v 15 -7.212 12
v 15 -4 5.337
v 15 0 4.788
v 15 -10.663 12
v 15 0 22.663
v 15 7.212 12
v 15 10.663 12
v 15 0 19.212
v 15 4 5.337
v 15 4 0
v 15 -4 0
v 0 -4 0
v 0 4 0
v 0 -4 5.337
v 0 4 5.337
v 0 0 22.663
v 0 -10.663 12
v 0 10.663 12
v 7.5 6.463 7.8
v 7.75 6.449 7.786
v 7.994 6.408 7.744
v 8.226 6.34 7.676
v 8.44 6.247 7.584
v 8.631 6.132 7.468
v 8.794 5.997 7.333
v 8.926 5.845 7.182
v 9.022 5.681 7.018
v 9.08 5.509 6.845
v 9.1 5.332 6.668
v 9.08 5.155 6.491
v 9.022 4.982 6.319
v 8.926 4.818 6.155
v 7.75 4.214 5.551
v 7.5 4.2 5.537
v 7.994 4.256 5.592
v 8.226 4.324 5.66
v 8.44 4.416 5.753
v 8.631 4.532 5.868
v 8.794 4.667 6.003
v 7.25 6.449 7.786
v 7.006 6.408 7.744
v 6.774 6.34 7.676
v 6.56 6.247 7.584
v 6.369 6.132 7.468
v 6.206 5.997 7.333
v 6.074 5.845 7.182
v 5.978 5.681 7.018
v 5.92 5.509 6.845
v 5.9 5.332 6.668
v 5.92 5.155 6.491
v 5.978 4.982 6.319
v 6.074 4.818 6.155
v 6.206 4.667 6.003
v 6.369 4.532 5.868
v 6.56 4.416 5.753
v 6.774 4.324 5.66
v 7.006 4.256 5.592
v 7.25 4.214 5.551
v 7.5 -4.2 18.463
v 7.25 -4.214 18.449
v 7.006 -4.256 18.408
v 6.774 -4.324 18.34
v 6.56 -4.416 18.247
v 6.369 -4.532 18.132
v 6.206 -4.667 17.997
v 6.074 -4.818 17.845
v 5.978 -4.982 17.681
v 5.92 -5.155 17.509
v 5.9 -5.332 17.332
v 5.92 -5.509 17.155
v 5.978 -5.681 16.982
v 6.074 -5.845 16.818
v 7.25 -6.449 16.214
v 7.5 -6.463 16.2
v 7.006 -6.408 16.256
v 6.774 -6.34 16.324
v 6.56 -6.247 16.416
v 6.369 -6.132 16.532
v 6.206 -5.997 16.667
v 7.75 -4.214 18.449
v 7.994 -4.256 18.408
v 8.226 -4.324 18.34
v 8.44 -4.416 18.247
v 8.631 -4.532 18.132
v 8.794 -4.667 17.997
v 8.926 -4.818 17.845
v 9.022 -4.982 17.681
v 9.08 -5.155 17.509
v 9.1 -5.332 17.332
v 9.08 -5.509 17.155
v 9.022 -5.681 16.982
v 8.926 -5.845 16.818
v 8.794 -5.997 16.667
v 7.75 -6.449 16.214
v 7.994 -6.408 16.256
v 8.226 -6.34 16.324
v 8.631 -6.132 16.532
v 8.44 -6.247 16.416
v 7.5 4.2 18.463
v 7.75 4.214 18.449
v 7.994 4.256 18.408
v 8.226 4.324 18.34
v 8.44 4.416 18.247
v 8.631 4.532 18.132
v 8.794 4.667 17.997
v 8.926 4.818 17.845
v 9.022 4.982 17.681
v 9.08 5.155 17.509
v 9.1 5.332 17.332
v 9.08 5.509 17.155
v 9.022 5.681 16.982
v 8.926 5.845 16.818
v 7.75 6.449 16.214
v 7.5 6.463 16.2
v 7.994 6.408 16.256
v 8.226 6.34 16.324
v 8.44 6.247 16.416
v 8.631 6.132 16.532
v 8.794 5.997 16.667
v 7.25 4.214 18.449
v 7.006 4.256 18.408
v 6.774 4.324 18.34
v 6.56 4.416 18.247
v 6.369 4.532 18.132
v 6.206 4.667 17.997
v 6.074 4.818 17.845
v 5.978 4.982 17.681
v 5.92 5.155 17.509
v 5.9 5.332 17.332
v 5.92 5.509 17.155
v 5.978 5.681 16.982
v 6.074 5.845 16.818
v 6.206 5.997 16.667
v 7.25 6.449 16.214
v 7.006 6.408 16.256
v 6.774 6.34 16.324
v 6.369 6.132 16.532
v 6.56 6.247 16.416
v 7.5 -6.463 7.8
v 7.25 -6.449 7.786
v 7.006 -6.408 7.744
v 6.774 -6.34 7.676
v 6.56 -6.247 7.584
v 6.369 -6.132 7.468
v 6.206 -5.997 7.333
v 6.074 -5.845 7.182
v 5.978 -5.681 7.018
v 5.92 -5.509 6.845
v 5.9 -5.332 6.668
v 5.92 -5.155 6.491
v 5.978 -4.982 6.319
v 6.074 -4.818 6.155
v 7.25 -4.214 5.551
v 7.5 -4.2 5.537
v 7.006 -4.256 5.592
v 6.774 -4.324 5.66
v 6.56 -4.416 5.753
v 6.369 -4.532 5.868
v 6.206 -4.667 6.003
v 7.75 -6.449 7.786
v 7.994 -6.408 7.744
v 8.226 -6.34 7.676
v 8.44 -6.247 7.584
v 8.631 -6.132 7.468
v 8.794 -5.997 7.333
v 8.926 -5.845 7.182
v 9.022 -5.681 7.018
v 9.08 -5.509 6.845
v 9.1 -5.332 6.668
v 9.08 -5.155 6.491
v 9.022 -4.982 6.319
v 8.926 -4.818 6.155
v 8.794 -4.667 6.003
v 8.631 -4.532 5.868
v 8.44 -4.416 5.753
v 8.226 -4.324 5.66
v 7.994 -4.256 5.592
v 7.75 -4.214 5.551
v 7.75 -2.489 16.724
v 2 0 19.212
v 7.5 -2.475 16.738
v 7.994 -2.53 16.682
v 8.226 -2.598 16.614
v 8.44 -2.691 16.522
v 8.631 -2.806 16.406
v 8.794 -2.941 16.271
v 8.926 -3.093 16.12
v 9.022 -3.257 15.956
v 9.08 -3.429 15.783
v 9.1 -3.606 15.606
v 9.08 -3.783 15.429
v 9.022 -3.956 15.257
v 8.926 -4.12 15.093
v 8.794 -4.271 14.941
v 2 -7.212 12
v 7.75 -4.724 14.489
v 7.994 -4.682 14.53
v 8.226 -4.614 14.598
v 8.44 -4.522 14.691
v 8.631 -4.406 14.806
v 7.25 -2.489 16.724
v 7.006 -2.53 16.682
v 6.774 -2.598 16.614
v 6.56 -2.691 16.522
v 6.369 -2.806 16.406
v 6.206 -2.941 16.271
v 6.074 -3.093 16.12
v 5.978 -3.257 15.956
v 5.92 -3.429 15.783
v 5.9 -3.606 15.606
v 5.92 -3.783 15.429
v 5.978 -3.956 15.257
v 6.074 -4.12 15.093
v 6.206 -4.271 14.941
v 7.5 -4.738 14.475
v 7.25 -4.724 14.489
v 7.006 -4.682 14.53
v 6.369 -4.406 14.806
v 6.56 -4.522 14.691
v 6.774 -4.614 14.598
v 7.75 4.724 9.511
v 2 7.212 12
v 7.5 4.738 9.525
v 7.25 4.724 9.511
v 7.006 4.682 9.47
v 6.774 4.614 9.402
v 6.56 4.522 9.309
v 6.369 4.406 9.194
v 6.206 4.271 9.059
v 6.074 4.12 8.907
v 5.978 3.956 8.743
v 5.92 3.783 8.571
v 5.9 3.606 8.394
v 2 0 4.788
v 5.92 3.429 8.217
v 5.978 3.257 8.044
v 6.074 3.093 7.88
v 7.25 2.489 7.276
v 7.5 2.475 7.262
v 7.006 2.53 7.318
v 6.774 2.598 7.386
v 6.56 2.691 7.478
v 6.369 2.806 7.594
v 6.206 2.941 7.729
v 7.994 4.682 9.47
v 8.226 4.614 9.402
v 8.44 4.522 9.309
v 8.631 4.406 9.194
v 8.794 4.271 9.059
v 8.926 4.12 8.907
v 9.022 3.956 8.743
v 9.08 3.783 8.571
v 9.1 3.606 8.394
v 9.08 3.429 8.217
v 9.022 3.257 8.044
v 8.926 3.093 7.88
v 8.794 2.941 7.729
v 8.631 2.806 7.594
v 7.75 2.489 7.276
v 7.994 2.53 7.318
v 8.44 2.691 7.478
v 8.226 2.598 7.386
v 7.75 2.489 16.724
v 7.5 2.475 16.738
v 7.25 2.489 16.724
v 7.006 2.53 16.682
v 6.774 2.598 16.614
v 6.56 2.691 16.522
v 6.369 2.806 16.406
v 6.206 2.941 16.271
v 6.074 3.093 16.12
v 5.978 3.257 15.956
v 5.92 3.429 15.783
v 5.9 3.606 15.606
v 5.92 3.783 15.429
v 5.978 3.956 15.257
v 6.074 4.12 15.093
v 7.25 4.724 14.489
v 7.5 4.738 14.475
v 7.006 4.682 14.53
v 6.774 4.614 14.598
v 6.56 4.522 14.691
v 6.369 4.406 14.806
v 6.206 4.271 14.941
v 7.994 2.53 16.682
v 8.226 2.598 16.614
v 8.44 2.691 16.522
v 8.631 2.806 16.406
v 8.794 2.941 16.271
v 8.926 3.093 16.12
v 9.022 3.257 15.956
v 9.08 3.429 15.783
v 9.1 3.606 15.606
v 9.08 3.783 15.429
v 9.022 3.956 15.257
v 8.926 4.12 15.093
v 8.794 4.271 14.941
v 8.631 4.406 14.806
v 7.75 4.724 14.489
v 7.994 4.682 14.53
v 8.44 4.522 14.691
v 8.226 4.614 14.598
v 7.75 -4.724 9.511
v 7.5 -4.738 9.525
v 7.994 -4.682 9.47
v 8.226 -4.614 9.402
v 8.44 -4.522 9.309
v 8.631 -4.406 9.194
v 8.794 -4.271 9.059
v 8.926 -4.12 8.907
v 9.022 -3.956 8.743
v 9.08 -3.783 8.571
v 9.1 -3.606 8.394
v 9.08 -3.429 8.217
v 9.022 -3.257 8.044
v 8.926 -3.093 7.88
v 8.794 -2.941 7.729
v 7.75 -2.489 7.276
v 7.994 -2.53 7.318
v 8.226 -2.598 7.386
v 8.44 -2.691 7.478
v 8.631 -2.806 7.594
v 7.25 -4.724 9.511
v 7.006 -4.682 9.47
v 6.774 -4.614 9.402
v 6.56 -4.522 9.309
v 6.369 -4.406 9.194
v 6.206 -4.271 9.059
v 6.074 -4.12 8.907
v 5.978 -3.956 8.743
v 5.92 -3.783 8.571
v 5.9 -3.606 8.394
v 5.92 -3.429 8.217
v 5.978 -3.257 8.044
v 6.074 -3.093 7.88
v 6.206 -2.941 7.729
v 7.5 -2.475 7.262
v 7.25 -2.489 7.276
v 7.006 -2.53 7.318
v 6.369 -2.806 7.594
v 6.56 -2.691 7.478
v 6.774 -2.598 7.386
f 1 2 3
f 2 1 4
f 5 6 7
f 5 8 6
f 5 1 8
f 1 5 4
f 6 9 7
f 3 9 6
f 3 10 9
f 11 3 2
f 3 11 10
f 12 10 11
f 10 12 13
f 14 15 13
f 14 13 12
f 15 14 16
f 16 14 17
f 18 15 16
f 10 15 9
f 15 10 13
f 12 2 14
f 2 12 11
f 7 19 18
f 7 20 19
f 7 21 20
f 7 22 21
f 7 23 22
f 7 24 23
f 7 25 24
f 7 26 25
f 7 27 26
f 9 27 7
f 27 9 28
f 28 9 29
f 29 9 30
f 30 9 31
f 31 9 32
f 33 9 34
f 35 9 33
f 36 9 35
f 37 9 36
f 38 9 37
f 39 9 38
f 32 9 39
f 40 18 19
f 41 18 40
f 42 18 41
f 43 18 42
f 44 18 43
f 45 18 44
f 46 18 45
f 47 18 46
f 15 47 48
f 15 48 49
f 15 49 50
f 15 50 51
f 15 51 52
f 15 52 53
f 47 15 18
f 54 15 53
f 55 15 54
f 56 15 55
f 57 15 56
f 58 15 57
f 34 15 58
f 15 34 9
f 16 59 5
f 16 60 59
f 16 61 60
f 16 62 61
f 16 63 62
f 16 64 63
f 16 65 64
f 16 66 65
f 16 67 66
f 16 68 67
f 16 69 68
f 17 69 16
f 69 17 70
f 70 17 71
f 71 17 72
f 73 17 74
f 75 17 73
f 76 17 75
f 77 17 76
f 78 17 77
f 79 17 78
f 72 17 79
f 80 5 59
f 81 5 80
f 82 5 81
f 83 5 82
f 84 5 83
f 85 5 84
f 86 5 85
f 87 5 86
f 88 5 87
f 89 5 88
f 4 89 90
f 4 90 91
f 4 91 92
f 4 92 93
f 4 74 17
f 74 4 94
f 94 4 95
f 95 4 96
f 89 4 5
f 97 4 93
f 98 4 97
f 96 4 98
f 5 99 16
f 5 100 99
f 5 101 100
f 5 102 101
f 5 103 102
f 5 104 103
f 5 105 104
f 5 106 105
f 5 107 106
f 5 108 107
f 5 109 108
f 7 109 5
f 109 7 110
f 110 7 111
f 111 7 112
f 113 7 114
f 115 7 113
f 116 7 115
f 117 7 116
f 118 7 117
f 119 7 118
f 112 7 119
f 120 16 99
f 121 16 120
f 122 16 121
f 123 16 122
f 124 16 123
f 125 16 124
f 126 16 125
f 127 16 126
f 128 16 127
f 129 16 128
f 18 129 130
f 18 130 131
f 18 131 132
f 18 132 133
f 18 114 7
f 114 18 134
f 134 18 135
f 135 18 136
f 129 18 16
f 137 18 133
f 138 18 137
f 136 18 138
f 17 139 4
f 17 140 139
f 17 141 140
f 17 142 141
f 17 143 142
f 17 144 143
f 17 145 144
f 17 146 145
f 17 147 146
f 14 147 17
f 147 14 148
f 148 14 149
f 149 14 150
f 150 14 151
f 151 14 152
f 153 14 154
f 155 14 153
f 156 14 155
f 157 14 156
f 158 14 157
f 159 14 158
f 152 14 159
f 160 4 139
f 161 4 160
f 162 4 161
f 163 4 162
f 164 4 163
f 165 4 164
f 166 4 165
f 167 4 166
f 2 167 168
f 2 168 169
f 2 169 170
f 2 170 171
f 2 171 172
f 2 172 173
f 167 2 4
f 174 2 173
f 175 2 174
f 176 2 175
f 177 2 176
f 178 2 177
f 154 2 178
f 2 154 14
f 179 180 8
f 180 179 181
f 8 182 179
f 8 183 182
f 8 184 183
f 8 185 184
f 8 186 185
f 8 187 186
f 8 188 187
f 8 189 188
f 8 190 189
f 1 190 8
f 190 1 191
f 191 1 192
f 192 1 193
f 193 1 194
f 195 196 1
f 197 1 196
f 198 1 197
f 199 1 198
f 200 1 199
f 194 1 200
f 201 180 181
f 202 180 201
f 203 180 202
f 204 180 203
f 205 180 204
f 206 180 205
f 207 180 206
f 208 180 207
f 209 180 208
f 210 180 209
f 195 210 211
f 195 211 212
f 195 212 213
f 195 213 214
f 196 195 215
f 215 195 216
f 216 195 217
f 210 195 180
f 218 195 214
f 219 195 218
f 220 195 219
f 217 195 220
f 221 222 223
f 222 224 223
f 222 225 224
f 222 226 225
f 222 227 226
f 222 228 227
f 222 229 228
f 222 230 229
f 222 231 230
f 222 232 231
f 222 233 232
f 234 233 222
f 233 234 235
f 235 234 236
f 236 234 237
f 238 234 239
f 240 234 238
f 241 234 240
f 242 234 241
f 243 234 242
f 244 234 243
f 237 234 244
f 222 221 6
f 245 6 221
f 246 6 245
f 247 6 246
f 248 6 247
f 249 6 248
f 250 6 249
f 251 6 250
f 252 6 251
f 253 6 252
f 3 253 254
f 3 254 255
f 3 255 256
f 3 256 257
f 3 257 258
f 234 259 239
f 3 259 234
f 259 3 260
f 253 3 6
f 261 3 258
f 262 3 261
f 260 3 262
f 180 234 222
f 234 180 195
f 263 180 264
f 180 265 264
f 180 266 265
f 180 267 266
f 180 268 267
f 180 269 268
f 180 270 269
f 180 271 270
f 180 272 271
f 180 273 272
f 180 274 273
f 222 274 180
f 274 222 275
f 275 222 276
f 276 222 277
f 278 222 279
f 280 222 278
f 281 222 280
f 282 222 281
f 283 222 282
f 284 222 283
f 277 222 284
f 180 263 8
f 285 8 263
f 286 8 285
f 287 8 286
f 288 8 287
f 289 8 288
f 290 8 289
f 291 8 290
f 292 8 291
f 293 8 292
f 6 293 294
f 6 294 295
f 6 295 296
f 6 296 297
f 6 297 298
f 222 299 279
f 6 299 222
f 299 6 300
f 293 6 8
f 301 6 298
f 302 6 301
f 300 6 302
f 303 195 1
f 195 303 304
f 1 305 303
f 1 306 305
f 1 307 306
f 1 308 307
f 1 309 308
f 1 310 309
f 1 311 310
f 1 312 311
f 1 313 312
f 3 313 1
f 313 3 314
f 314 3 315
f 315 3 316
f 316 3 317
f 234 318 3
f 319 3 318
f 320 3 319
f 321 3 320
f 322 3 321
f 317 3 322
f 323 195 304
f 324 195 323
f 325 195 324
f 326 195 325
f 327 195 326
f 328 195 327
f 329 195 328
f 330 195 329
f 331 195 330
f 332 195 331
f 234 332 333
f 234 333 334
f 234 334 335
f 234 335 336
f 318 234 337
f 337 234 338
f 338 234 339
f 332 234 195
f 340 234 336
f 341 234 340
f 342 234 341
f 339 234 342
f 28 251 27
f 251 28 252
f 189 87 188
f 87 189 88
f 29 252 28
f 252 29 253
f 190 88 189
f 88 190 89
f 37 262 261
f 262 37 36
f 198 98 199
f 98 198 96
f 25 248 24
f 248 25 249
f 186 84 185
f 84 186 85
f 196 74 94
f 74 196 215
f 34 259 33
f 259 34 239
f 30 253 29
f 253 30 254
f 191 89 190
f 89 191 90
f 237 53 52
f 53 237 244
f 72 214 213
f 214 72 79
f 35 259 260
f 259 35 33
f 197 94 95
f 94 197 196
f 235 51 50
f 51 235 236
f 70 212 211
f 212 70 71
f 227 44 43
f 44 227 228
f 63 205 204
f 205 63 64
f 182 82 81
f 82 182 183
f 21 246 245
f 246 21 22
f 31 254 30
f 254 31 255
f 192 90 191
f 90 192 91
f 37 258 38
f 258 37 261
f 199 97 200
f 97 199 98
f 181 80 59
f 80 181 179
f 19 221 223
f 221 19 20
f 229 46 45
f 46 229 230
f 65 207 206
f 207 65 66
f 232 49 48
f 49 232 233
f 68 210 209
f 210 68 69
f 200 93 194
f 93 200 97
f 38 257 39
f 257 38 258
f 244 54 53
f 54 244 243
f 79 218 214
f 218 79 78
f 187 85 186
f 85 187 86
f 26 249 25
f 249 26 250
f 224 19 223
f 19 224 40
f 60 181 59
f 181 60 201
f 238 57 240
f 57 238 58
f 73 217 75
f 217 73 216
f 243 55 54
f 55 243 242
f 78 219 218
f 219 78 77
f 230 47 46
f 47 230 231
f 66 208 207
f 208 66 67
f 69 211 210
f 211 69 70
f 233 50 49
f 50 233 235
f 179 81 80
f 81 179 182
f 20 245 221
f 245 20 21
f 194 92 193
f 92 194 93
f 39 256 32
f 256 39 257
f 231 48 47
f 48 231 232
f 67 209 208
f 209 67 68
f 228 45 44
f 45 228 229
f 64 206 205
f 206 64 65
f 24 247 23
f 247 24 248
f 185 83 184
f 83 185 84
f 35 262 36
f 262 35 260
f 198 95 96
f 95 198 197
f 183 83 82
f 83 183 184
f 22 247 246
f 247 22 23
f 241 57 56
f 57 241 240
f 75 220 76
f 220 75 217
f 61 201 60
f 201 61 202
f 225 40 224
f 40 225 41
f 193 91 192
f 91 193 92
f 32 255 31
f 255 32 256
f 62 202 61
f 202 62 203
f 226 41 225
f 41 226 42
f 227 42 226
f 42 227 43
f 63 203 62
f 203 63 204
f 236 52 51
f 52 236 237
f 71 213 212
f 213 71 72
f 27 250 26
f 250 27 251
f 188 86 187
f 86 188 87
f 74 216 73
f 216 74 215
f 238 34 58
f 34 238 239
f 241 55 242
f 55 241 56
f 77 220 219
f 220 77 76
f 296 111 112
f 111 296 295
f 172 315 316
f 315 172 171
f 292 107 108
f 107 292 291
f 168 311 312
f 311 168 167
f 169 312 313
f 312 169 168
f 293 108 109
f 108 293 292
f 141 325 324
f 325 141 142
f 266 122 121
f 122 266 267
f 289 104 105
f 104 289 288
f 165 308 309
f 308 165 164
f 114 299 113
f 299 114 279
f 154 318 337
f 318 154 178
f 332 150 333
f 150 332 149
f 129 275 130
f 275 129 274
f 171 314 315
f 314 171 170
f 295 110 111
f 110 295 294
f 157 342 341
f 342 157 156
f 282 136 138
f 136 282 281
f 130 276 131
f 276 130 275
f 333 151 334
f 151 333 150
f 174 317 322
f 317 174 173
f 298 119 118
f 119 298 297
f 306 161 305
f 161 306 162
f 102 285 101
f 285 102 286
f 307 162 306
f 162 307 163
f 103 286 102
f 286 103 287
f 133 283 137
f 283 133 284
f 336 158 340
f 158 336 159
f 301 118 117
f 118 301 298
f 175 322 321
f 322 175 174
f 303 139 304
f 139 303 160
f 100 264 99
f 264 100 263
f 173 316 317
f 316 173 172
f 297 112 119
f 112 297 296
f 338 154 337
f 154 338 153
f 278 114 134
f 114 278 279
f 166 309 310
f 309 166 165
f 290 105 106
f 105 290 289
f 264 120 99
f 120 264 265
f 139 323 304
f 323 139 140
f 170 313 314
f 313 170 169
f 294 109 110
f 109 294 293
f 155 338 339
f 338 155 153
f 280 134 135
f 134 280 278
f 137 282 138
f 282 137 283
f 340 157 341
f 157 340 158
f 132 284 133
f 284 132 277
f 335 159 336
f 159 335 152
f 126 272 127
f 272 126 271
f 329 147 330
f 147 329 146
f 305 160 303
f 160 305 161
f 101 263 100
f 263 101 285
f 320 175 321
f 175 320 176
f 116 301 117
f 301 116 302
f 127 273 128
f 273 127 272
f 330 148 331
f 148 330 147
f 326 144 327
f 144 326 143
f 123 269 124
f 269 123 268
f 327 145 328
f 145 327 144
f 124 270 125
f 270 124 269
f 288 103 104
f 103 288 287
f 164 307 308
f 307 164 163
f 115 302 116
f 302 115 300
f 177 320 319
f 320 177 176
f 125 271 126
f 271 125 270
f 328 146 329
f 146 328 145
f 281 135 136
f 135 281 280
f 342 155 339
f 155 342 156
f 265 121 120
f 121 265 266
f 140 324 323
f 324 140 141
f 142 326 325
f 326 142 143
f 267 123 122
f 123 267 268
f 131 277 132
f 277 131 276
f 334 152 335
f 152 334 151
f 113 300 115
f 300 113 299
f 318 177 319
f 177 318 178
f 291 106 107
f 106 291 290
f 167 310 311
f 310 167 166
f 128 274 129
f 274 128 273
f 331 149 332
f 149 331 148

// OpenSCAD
// MakerBeam Library
// Version 20100413

// Copyright 2010, by Andrew Plumb
// Licensed under the Attribution - Creative Commons license
//   http://creativecommons.org/licenses/by/3.0/

// - Uses smallest length MakerBeam Mini-T beams
// - Fits diagonally on my Batch 1 MakerBot Z-platform

// For more information about OpenSCAD:
//   - see http://www.openscad.org/
// For more information about MakerBeam:
//   - see http://www.makerbeam.com/

// To Do:
// - make corner pieces with integrated bearing brackets.

$fa=9;
$fs=0.1;

scale_1in=25.4;

// render_part=3; // The part the Flex-Shaft screws into.
// render_part=6; // An optional part to bolt on the Flex-Shaft handle
// render_part=9; // The Mini-T to Z-platform M5 bolt hold adapter part
 render_part=10; // mini_t_socket


module mini_t_socket(
	rotAngle=0
	, mini_t_z=12.0
	, mini_t_r=15.0/2
	, mini_t_d=15.0
	, mini_t_wall=0.1*scale_1in
  ) {
  difference () {
    union () {
	    rotate([0,0,rotAngle])translate([mini_t_r-mini_t_d/2,-4.0,0]) {
		scale([mini_t_d,8.0,mini_t_z]) cube(size=1.0,center=false);
	    }
	    rotate([0,0,rotAngle])
		translate([mini_t_r
		  , 0
		  , mini_t_z
		])
		rotate([45,0,0])
		  scale([mini_t_d,10.0+2*mini_t_wall,10.0+2*mini_t_wall])
			cube(size=1.0,center=true);
    }
    union () {
	    rotate([0,0,rotAngle])
		translate([mini_t_r
			, 0.0
			, mini_t_z
		]) rotate([45,0,0]) {
		  translate([2.0,0,0]) scale([mini_t_d,10.2,10.2])
			cube(size=1.0,center=true);
		  cylinder(r=1.6
			, h=20.0
			, center=true
		  );
		  rotate([90,0,0]) cylinder(r=1.6
			, h=20.0
			, center=true
		  );
	    }
    }
  }
}


module dremel_flexshaft_mount_body(
	arms=6
	, mini_t_z=12.0
	, mini_t_r=20.0
	, mini_t_d=10.0
	, mini_t_wall=0.1*scale_1in
  ) {
  union () {
	difference() { 
	  cylinder(
	    r=0.75*scale_1in
	    , h=1.7*0.25*scale_1in
	    , center=false
	  );
	  translate([0,0,0.25*scale_1in])
		cylinder(
		  r=0.5*scale_1in
		  , h=0.25*scale_1in+0.1
		  , center=false
		);
	}
	for( i=[0:arms-1] ) {
	  assign(rotAngle=i*360/arms) {
	    rotate([0,0,rotAngle])translate([mini_t_r-mini_t_d/2,-4.0,0]) {
		scale([mini_t_d,8.0,mini_t_z]) cube(size=1.0,center=false);
	    }
	    rotate([0,0,rotAngle])
		translate([mini_t_r
		  , 0
		  , mini_t_z
		])
		rotate([45,0,0])
		  scale([mini_t_d,10.0+2*mini_t_wall,10.0+2*mini_t_wall])
			cube(size=1.0,center=true);
	  }
	}
  }
}

module dremel_flexshaft_mount_holes(
	arms=6
	, mini_t_z=12.0
	, mini_t_r=20.0
	, mini_t_d=10.0
  ) {
  union () {
	translate([0,0,-0.5*scale_1in]) cylinder(
	  r=0.25*scale_1in
	  , h=1.0*scale_1in
	  , center=false
	);
	for( i=[0:arms-1] ) {
	  assign(rotAngle=i*360/arms) {
	    rotate([0,0,rotAngle])
		translate([mini_t_r
			, 0.0
			, mini_t_z
		]) rotate([45,0,0]) {
		  translate([2.0,0,0]) scale([mini_t_d,10.2,10.2])
			cube(size=1.0,center=true);
		  cylinder(r=1.6
			, h=20.0
			, center=true
		  );
		  rotate([90,0,0]) cylinder(r=1.6
			, h=20.0
			, center=true
		  );
	    }
	  }
	}
  }
}

module dremel_flexshaft_mount() {
  difference () {
    dremel_flexshaft_mount_body(mini_t_z=10.0);
    dremel_flexshaft_mount_holes(mini_t_z=10.0);
    translate([0,0,-10.0])
	cylinder(r=50.0,h=10.0,center=false);
  }
}

module handle_body(arms=6) {
  union () {
	translate([0,0,0]) cylinder(
	  r=(1.0+0.5)*scale_1in/2
	  , h=1.0*scale_1in
	  , center=false
	);
	for( i=[0:arms-1] ) {
	  assign(rotAngle=i*360/arms) {
	    rotate([0,0,rotAngle])translate([20.0+2.5,0,5.0/2]) {
		scale([11.0,8.0,5.0]) cube(size=1.0,center=true);
	    }
	    rotate([45,0,rotAngle])
		translate([22.0
			,1.414*10.0/2+0.47
			,1.414*10.0/2+0.47
		])
		  scale([12.0,10.0+2*0.1*scale_1in,10.0+2*0.1*scale_1in])
			cube(size=1.0,center=true);
	  }
	}
  }
}

module handle_holes(arms=6) {
  union () {
	translate([0,0,-1.0*scale_1in/2]) cylinder(
	  r=0.5*scale_1in
	  , h=2.0*scale_1in
	  , center=false
	);
	for( i=[0:arms-1] ) {
	  assign(rotAngle=i*360/arms) {
	    rotate([45,0,rotAngle]) {
		translate([23.0
			,1.414*10.0/2+0.47
			,1.414*10.0/2+0.47
		])
		  scale([12.0,10.2,10.2])
			cube(size=1.0,center=true);
		translate([23.0
			,1.414*10.0/2+0.47
			,1.414*10.0/2+0.47]) {
		  cylinder(r=1.6
			, h=20.0
			, center=true
		  );
		  rotate([90,0,0]) cylinder(r=1.6
			, h=20.0
			, center=true
		  );
		}
	    }
	    rotate([0,0,rotAngle]) {
		translate([0,0,0.8*scale_1in]) {
		  rotate([90,rotAngle,0]) cylinder(r=1.5,h=2.0*scale_1in,center=false);
		  translate([0,1.0*scale_1in/2,0])
		    scale([6.5,5.5,0.5*scale_1in+3.0]) cube(size=1.0, center=true);
		}
	    }
	  }
	}
  }
}

module flex_handle() {
  difference () {
    handle_body();
    handle_holes();
  }
}

module bracket_body(arms=3) {
  union () {
	cylinder(
	  r=12.0
	  , h=11.0
	  , center=false
	);
	for( i=[0:arms-1] ) {
	  assign(rotAngle=i*360/arms) {
	    rotate([0,0,rotAngle])translate([12.0+2.5,0,5.0/2]) {
		scale([7.0,8.0,5.0]) cube(size=1.0,center=true);
	    }
	    rotate([45,0,rotAngle]) {
		translate([12.0
			,1.414*10.0/2+0.47
			,1.414*10.0/2+0.47
		])
		  scale([12.0,10.0+2*0.1*scale_1in,10.0+2*0.1*scale_1in])
			cube(size=1.0,center=true);
	    }
	  }
	}
  }
}

module bracket_holes(arms=3) {
  union () {
	translate([0,0,-0.1]) cylinder(
	  r=2.5
	  , h=11.0+0.2
	  , center=false
	);
	translate([0,0,5.0]) cylinder(
	  r=6.0
	  , h=6.0+0.1
	  , center=false
	);
	for( i=[0:arms-1] ) {
	  assign(rotAngle=i*360/arms) {
	    rotate([45,0,rotAngle]) {
		translate([13.0
			,1.414*10.0/2+0.47
			,1.414*10.0/2+0.47
		])
		  scale([12.0,10.2,10.2])
			cube(size=1.0,center=true);
		translate([13.0
			,1.414*10.0/2+0.47
			,1.414*10.0/2+0.47]) {
		  cylinder(r=1.6
			, h=20.0
			, center=true
		  );
		  rotate([90,0,0]) cylinder(r=1.6
			, h=20.0
			, center=true
		  );
		}
	    }
	  }
	}
  }
}

module flex_bracket() {
  difference () {
    bracket_body();
    bracket_holes();
  }
}


if( render_part==1 ) {
  echo("Rendering dremel_flexshaft_mount_body()...");
  dremel_flexshaft_mount_body();
}


if( render_part==2 ) {
  echo("Rendering dremel_flexshaft_mount_holes()...");
  dremel_flexshaft_mount_holes();
}

if( render_part==3 ) {
  echo("Rendering dremel_flexshaft_mount()...");
  dremel_flexshaft_mount();
}

if( render_part==4 ) {
  echo("Rendering handle_body()...");
  handle_body();
}


if( render_part==5 ) {
  echo("Rendering handle_holes()...");
  handle_holes();
}

if( render_part==6 ) {
  echo("Rendering flex_handle()...");
  flex_handle();
}

if( render_part==7 ) {
  echo("Rendering bracket_body()...");
  bracket_body();
}


if( render_part==8 ) {
  echo("Rendering bracket_holes()...");
  bracket_holes();
}

if( render_part==9 ) {
  echo("Rendering bracket_handle()...");
  flex_bracket();
}

if( render_part==10 ) {
  echo("Rendering mini_t_socket()...");
  mini_t_socket();
}
